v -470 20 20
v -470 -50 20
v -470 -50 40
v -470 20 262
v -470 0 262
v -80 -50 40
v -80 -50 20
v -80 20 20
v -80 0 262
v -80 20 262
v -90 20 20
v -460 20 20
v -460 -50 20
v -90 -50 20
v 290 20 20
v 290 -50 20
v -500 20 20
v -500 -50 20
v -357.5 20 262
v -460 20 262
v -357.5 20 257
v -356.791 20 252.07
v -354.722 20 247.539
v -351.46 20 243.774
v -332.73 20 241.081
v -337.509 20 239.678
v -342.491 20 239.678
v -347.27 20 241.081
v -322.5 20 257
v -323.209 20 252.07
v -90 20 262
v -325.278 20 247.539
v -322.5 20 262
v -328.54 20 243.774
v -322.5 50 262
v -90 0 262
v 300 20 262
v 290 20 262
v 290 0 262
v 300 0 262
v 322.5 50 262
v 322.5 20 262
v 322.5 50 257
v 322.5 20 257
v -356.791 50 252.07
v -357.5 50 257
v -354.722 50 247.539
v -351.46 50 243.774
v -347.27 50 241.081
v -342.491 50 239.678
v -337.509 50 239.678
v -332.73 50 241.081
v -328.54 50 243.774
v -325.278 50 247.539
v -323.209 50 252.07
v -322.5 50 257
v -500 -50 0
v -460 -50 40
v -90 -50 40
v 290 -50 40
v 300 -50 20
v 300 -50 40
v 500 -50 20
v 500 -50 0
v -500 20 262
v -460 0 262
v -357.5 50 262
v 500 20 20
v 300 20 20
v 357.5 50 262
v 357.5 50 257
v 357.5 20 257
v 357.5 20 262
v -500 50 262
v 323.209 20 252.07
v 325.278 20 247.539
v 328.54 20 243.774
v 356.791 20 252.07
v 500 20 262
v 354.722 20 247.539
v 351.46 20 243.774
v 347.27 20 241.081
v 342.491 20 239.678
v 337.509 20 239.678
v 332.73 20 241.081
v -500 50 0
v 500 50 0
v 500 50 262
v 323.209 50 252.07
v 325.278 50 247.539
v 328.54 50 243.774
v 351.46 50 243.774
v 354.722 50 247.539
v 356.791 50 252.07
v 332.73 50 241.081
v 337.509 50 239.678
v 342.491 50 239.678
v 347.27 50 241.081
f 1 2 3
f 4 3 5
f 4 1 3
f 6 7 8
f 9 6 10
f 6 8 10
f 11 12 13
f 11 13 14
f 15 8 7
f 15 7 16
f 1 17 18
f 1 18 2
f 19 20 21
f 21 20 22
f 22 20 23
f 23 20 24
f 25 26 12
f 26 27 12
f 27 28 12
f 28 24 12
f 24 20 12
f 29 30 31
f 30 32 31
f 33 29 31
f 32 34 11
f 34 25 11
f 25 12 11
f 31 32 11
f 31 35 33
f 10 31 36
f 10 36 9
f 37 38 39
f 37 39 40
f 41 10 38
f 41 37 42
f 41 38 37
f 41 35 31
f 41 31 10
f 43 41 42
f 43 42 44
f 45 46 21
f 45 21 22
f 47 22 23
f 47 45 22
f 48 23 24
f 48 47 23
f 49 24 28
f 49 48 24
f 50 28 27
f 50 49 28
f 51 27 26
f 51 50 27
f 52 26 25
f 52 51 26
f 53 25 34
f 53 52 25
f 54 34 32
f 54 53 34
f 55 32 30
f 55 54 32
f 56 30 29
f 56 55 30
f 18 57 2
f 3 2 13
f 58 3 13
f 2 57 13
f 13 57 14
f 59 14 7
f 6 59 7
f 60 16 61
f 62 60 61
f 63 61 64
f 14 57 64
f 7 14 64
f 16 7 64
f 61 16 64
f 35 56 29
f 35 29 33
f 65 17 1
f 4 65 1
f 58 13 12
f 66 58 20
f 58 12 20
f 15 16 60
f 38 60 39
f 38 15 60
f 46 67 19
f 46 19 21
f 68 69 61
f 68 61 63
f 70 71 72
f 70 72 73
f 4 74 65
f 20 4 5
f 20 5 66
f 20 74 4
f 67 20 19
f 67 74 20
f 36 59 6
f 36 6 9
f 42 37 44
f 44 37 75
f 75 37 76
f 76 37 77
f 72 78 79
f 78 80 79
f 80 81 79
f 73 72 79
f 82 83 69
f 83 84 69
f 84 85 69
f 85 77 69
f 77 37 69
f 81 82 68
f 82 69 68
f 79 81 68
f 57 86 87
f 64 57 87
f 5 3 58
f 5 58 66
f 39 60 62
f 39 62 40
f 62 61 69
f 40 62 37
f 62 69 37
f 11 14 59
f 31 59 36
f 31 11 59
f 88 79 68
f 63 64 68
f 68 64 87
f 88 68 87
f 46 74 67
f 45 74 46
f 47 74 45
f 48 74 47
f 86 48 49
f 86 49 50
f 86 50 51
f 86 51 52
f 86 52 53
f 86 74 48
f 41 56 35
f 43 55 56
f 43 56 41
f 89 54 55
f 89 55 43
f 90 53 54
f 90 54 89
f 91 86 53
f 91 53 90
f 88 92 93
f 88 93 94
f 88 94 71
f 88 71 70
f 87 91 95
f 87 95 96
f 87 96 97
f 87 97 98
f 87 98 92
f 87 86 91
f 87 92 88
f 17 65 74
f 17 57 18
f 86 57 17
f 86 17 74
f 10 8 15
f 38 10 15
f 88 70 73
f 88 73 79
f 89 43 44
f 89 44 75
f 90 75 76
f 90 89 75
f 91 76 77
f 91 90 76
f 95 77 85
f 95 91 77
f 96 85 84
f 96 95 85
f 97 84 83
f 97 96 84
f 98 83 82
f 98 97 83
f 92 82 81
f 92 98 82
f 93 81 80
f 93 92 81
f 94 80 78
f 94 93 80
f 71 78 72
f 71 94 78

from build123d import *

# Parameters (mm, degrees)
SKETCH_1_W             = 1000
SKETCH_1_H             = 100
EXTRUDE_1_DEPTH        = 20
SKETCH_2_W             = 1000
SKETCH_2_H             = 30
EXTRUDE_2_DEPTH        = 242
EXTRUDE_START          = -30
EXTRUDE_3_DEPTH        = 10
PATTERN_LINEAR_1_COUNT = 3
PATTERN_LINEAR_1_PITCH = 380
CUT_EXTRUDE_1_DEPTH    = 574.274803214


with BuildPart() as part:
    # 草图1 → 凸台-拉伸1 (new body)
    with BuildSketch(Plane.XY):
        Rectangle(SKETCH_1_W, SKETCH_1_H)
    extrude(amount=EXTRUDE_1_DEPTH)



with BuildPart() as body_2:
    # 草图2 → 凸台-拉伸2 (new body)
    with BuildSketch(Plane.XY.offset(20)):
        with Locations((0, 35)):
            Rectangle(SKETCH_2_W, SKETCH_2_H)
    extrude(amount=EXTRUDE_2_DEPTH)


with BuildPart() as part_1:
    add(part.part)

    add(body_2.part)  # 凸台-拉伸3 merges body 2
    # 草图3 → 凸台-拉伸3 (add)
    with BuildSketch(Plane.ZY.offset(500).offset(EXTRUDE_START)):
        Polygon((262, 20), (20, 20), (20, -50), (40, -50), (262, 0), align=None)
    extrude_3 = extrude(amount=-EXTRUDE_3_DEPTH)

    # 阵列(线性)1: 凸台-拉伸3 ×3
    with Locations(*[(i * PATTERN_LINEAR_1_PITCH, 0, 0) for i in range(1, PATTERN_LINEAR_1_COUNT)]):
        add(extrude_3)

    # 草图5 → 切除-拉伸1 (cut, through all)
    with BuildSketch(Plane(origin=(0, 50, 0), x_dir=(1, 0, 0), z_dir=(0, 1, 0))):
        with BuildLine():
            Line((357.5, -256.999999998), (357.5, -337.435999102))
            ThreePointArc((357.5, -337.435999102), (340, -354.935999102), (322.5, -337.435999102))
            Line((322.5, -337.435999102), (322.5, -256.999999998))
            ThreePointArc((322.5, -256.999999998), (340, -239.499999998), (357.5, -256.999999998))
        make_face()
        with BuildLine():
            Line((-322.5, -257), (-322.5, -349.000883912))
            ThreePointArc((-322.5, -349.000883912), (-340, -366.500883912), (-357.5, -349.000883912))
            Line((-357.5, -349.000883912), (-357.5, -257))
            ThreePointArc((-357.5, -257), (-340, -239.5), (-322.5, -257))
        make_face()
    extrude(amount=-CUT_EXTRUDE_1_DEPTH, mode=Mode.SUBTRACT)


solid = part_1.part
